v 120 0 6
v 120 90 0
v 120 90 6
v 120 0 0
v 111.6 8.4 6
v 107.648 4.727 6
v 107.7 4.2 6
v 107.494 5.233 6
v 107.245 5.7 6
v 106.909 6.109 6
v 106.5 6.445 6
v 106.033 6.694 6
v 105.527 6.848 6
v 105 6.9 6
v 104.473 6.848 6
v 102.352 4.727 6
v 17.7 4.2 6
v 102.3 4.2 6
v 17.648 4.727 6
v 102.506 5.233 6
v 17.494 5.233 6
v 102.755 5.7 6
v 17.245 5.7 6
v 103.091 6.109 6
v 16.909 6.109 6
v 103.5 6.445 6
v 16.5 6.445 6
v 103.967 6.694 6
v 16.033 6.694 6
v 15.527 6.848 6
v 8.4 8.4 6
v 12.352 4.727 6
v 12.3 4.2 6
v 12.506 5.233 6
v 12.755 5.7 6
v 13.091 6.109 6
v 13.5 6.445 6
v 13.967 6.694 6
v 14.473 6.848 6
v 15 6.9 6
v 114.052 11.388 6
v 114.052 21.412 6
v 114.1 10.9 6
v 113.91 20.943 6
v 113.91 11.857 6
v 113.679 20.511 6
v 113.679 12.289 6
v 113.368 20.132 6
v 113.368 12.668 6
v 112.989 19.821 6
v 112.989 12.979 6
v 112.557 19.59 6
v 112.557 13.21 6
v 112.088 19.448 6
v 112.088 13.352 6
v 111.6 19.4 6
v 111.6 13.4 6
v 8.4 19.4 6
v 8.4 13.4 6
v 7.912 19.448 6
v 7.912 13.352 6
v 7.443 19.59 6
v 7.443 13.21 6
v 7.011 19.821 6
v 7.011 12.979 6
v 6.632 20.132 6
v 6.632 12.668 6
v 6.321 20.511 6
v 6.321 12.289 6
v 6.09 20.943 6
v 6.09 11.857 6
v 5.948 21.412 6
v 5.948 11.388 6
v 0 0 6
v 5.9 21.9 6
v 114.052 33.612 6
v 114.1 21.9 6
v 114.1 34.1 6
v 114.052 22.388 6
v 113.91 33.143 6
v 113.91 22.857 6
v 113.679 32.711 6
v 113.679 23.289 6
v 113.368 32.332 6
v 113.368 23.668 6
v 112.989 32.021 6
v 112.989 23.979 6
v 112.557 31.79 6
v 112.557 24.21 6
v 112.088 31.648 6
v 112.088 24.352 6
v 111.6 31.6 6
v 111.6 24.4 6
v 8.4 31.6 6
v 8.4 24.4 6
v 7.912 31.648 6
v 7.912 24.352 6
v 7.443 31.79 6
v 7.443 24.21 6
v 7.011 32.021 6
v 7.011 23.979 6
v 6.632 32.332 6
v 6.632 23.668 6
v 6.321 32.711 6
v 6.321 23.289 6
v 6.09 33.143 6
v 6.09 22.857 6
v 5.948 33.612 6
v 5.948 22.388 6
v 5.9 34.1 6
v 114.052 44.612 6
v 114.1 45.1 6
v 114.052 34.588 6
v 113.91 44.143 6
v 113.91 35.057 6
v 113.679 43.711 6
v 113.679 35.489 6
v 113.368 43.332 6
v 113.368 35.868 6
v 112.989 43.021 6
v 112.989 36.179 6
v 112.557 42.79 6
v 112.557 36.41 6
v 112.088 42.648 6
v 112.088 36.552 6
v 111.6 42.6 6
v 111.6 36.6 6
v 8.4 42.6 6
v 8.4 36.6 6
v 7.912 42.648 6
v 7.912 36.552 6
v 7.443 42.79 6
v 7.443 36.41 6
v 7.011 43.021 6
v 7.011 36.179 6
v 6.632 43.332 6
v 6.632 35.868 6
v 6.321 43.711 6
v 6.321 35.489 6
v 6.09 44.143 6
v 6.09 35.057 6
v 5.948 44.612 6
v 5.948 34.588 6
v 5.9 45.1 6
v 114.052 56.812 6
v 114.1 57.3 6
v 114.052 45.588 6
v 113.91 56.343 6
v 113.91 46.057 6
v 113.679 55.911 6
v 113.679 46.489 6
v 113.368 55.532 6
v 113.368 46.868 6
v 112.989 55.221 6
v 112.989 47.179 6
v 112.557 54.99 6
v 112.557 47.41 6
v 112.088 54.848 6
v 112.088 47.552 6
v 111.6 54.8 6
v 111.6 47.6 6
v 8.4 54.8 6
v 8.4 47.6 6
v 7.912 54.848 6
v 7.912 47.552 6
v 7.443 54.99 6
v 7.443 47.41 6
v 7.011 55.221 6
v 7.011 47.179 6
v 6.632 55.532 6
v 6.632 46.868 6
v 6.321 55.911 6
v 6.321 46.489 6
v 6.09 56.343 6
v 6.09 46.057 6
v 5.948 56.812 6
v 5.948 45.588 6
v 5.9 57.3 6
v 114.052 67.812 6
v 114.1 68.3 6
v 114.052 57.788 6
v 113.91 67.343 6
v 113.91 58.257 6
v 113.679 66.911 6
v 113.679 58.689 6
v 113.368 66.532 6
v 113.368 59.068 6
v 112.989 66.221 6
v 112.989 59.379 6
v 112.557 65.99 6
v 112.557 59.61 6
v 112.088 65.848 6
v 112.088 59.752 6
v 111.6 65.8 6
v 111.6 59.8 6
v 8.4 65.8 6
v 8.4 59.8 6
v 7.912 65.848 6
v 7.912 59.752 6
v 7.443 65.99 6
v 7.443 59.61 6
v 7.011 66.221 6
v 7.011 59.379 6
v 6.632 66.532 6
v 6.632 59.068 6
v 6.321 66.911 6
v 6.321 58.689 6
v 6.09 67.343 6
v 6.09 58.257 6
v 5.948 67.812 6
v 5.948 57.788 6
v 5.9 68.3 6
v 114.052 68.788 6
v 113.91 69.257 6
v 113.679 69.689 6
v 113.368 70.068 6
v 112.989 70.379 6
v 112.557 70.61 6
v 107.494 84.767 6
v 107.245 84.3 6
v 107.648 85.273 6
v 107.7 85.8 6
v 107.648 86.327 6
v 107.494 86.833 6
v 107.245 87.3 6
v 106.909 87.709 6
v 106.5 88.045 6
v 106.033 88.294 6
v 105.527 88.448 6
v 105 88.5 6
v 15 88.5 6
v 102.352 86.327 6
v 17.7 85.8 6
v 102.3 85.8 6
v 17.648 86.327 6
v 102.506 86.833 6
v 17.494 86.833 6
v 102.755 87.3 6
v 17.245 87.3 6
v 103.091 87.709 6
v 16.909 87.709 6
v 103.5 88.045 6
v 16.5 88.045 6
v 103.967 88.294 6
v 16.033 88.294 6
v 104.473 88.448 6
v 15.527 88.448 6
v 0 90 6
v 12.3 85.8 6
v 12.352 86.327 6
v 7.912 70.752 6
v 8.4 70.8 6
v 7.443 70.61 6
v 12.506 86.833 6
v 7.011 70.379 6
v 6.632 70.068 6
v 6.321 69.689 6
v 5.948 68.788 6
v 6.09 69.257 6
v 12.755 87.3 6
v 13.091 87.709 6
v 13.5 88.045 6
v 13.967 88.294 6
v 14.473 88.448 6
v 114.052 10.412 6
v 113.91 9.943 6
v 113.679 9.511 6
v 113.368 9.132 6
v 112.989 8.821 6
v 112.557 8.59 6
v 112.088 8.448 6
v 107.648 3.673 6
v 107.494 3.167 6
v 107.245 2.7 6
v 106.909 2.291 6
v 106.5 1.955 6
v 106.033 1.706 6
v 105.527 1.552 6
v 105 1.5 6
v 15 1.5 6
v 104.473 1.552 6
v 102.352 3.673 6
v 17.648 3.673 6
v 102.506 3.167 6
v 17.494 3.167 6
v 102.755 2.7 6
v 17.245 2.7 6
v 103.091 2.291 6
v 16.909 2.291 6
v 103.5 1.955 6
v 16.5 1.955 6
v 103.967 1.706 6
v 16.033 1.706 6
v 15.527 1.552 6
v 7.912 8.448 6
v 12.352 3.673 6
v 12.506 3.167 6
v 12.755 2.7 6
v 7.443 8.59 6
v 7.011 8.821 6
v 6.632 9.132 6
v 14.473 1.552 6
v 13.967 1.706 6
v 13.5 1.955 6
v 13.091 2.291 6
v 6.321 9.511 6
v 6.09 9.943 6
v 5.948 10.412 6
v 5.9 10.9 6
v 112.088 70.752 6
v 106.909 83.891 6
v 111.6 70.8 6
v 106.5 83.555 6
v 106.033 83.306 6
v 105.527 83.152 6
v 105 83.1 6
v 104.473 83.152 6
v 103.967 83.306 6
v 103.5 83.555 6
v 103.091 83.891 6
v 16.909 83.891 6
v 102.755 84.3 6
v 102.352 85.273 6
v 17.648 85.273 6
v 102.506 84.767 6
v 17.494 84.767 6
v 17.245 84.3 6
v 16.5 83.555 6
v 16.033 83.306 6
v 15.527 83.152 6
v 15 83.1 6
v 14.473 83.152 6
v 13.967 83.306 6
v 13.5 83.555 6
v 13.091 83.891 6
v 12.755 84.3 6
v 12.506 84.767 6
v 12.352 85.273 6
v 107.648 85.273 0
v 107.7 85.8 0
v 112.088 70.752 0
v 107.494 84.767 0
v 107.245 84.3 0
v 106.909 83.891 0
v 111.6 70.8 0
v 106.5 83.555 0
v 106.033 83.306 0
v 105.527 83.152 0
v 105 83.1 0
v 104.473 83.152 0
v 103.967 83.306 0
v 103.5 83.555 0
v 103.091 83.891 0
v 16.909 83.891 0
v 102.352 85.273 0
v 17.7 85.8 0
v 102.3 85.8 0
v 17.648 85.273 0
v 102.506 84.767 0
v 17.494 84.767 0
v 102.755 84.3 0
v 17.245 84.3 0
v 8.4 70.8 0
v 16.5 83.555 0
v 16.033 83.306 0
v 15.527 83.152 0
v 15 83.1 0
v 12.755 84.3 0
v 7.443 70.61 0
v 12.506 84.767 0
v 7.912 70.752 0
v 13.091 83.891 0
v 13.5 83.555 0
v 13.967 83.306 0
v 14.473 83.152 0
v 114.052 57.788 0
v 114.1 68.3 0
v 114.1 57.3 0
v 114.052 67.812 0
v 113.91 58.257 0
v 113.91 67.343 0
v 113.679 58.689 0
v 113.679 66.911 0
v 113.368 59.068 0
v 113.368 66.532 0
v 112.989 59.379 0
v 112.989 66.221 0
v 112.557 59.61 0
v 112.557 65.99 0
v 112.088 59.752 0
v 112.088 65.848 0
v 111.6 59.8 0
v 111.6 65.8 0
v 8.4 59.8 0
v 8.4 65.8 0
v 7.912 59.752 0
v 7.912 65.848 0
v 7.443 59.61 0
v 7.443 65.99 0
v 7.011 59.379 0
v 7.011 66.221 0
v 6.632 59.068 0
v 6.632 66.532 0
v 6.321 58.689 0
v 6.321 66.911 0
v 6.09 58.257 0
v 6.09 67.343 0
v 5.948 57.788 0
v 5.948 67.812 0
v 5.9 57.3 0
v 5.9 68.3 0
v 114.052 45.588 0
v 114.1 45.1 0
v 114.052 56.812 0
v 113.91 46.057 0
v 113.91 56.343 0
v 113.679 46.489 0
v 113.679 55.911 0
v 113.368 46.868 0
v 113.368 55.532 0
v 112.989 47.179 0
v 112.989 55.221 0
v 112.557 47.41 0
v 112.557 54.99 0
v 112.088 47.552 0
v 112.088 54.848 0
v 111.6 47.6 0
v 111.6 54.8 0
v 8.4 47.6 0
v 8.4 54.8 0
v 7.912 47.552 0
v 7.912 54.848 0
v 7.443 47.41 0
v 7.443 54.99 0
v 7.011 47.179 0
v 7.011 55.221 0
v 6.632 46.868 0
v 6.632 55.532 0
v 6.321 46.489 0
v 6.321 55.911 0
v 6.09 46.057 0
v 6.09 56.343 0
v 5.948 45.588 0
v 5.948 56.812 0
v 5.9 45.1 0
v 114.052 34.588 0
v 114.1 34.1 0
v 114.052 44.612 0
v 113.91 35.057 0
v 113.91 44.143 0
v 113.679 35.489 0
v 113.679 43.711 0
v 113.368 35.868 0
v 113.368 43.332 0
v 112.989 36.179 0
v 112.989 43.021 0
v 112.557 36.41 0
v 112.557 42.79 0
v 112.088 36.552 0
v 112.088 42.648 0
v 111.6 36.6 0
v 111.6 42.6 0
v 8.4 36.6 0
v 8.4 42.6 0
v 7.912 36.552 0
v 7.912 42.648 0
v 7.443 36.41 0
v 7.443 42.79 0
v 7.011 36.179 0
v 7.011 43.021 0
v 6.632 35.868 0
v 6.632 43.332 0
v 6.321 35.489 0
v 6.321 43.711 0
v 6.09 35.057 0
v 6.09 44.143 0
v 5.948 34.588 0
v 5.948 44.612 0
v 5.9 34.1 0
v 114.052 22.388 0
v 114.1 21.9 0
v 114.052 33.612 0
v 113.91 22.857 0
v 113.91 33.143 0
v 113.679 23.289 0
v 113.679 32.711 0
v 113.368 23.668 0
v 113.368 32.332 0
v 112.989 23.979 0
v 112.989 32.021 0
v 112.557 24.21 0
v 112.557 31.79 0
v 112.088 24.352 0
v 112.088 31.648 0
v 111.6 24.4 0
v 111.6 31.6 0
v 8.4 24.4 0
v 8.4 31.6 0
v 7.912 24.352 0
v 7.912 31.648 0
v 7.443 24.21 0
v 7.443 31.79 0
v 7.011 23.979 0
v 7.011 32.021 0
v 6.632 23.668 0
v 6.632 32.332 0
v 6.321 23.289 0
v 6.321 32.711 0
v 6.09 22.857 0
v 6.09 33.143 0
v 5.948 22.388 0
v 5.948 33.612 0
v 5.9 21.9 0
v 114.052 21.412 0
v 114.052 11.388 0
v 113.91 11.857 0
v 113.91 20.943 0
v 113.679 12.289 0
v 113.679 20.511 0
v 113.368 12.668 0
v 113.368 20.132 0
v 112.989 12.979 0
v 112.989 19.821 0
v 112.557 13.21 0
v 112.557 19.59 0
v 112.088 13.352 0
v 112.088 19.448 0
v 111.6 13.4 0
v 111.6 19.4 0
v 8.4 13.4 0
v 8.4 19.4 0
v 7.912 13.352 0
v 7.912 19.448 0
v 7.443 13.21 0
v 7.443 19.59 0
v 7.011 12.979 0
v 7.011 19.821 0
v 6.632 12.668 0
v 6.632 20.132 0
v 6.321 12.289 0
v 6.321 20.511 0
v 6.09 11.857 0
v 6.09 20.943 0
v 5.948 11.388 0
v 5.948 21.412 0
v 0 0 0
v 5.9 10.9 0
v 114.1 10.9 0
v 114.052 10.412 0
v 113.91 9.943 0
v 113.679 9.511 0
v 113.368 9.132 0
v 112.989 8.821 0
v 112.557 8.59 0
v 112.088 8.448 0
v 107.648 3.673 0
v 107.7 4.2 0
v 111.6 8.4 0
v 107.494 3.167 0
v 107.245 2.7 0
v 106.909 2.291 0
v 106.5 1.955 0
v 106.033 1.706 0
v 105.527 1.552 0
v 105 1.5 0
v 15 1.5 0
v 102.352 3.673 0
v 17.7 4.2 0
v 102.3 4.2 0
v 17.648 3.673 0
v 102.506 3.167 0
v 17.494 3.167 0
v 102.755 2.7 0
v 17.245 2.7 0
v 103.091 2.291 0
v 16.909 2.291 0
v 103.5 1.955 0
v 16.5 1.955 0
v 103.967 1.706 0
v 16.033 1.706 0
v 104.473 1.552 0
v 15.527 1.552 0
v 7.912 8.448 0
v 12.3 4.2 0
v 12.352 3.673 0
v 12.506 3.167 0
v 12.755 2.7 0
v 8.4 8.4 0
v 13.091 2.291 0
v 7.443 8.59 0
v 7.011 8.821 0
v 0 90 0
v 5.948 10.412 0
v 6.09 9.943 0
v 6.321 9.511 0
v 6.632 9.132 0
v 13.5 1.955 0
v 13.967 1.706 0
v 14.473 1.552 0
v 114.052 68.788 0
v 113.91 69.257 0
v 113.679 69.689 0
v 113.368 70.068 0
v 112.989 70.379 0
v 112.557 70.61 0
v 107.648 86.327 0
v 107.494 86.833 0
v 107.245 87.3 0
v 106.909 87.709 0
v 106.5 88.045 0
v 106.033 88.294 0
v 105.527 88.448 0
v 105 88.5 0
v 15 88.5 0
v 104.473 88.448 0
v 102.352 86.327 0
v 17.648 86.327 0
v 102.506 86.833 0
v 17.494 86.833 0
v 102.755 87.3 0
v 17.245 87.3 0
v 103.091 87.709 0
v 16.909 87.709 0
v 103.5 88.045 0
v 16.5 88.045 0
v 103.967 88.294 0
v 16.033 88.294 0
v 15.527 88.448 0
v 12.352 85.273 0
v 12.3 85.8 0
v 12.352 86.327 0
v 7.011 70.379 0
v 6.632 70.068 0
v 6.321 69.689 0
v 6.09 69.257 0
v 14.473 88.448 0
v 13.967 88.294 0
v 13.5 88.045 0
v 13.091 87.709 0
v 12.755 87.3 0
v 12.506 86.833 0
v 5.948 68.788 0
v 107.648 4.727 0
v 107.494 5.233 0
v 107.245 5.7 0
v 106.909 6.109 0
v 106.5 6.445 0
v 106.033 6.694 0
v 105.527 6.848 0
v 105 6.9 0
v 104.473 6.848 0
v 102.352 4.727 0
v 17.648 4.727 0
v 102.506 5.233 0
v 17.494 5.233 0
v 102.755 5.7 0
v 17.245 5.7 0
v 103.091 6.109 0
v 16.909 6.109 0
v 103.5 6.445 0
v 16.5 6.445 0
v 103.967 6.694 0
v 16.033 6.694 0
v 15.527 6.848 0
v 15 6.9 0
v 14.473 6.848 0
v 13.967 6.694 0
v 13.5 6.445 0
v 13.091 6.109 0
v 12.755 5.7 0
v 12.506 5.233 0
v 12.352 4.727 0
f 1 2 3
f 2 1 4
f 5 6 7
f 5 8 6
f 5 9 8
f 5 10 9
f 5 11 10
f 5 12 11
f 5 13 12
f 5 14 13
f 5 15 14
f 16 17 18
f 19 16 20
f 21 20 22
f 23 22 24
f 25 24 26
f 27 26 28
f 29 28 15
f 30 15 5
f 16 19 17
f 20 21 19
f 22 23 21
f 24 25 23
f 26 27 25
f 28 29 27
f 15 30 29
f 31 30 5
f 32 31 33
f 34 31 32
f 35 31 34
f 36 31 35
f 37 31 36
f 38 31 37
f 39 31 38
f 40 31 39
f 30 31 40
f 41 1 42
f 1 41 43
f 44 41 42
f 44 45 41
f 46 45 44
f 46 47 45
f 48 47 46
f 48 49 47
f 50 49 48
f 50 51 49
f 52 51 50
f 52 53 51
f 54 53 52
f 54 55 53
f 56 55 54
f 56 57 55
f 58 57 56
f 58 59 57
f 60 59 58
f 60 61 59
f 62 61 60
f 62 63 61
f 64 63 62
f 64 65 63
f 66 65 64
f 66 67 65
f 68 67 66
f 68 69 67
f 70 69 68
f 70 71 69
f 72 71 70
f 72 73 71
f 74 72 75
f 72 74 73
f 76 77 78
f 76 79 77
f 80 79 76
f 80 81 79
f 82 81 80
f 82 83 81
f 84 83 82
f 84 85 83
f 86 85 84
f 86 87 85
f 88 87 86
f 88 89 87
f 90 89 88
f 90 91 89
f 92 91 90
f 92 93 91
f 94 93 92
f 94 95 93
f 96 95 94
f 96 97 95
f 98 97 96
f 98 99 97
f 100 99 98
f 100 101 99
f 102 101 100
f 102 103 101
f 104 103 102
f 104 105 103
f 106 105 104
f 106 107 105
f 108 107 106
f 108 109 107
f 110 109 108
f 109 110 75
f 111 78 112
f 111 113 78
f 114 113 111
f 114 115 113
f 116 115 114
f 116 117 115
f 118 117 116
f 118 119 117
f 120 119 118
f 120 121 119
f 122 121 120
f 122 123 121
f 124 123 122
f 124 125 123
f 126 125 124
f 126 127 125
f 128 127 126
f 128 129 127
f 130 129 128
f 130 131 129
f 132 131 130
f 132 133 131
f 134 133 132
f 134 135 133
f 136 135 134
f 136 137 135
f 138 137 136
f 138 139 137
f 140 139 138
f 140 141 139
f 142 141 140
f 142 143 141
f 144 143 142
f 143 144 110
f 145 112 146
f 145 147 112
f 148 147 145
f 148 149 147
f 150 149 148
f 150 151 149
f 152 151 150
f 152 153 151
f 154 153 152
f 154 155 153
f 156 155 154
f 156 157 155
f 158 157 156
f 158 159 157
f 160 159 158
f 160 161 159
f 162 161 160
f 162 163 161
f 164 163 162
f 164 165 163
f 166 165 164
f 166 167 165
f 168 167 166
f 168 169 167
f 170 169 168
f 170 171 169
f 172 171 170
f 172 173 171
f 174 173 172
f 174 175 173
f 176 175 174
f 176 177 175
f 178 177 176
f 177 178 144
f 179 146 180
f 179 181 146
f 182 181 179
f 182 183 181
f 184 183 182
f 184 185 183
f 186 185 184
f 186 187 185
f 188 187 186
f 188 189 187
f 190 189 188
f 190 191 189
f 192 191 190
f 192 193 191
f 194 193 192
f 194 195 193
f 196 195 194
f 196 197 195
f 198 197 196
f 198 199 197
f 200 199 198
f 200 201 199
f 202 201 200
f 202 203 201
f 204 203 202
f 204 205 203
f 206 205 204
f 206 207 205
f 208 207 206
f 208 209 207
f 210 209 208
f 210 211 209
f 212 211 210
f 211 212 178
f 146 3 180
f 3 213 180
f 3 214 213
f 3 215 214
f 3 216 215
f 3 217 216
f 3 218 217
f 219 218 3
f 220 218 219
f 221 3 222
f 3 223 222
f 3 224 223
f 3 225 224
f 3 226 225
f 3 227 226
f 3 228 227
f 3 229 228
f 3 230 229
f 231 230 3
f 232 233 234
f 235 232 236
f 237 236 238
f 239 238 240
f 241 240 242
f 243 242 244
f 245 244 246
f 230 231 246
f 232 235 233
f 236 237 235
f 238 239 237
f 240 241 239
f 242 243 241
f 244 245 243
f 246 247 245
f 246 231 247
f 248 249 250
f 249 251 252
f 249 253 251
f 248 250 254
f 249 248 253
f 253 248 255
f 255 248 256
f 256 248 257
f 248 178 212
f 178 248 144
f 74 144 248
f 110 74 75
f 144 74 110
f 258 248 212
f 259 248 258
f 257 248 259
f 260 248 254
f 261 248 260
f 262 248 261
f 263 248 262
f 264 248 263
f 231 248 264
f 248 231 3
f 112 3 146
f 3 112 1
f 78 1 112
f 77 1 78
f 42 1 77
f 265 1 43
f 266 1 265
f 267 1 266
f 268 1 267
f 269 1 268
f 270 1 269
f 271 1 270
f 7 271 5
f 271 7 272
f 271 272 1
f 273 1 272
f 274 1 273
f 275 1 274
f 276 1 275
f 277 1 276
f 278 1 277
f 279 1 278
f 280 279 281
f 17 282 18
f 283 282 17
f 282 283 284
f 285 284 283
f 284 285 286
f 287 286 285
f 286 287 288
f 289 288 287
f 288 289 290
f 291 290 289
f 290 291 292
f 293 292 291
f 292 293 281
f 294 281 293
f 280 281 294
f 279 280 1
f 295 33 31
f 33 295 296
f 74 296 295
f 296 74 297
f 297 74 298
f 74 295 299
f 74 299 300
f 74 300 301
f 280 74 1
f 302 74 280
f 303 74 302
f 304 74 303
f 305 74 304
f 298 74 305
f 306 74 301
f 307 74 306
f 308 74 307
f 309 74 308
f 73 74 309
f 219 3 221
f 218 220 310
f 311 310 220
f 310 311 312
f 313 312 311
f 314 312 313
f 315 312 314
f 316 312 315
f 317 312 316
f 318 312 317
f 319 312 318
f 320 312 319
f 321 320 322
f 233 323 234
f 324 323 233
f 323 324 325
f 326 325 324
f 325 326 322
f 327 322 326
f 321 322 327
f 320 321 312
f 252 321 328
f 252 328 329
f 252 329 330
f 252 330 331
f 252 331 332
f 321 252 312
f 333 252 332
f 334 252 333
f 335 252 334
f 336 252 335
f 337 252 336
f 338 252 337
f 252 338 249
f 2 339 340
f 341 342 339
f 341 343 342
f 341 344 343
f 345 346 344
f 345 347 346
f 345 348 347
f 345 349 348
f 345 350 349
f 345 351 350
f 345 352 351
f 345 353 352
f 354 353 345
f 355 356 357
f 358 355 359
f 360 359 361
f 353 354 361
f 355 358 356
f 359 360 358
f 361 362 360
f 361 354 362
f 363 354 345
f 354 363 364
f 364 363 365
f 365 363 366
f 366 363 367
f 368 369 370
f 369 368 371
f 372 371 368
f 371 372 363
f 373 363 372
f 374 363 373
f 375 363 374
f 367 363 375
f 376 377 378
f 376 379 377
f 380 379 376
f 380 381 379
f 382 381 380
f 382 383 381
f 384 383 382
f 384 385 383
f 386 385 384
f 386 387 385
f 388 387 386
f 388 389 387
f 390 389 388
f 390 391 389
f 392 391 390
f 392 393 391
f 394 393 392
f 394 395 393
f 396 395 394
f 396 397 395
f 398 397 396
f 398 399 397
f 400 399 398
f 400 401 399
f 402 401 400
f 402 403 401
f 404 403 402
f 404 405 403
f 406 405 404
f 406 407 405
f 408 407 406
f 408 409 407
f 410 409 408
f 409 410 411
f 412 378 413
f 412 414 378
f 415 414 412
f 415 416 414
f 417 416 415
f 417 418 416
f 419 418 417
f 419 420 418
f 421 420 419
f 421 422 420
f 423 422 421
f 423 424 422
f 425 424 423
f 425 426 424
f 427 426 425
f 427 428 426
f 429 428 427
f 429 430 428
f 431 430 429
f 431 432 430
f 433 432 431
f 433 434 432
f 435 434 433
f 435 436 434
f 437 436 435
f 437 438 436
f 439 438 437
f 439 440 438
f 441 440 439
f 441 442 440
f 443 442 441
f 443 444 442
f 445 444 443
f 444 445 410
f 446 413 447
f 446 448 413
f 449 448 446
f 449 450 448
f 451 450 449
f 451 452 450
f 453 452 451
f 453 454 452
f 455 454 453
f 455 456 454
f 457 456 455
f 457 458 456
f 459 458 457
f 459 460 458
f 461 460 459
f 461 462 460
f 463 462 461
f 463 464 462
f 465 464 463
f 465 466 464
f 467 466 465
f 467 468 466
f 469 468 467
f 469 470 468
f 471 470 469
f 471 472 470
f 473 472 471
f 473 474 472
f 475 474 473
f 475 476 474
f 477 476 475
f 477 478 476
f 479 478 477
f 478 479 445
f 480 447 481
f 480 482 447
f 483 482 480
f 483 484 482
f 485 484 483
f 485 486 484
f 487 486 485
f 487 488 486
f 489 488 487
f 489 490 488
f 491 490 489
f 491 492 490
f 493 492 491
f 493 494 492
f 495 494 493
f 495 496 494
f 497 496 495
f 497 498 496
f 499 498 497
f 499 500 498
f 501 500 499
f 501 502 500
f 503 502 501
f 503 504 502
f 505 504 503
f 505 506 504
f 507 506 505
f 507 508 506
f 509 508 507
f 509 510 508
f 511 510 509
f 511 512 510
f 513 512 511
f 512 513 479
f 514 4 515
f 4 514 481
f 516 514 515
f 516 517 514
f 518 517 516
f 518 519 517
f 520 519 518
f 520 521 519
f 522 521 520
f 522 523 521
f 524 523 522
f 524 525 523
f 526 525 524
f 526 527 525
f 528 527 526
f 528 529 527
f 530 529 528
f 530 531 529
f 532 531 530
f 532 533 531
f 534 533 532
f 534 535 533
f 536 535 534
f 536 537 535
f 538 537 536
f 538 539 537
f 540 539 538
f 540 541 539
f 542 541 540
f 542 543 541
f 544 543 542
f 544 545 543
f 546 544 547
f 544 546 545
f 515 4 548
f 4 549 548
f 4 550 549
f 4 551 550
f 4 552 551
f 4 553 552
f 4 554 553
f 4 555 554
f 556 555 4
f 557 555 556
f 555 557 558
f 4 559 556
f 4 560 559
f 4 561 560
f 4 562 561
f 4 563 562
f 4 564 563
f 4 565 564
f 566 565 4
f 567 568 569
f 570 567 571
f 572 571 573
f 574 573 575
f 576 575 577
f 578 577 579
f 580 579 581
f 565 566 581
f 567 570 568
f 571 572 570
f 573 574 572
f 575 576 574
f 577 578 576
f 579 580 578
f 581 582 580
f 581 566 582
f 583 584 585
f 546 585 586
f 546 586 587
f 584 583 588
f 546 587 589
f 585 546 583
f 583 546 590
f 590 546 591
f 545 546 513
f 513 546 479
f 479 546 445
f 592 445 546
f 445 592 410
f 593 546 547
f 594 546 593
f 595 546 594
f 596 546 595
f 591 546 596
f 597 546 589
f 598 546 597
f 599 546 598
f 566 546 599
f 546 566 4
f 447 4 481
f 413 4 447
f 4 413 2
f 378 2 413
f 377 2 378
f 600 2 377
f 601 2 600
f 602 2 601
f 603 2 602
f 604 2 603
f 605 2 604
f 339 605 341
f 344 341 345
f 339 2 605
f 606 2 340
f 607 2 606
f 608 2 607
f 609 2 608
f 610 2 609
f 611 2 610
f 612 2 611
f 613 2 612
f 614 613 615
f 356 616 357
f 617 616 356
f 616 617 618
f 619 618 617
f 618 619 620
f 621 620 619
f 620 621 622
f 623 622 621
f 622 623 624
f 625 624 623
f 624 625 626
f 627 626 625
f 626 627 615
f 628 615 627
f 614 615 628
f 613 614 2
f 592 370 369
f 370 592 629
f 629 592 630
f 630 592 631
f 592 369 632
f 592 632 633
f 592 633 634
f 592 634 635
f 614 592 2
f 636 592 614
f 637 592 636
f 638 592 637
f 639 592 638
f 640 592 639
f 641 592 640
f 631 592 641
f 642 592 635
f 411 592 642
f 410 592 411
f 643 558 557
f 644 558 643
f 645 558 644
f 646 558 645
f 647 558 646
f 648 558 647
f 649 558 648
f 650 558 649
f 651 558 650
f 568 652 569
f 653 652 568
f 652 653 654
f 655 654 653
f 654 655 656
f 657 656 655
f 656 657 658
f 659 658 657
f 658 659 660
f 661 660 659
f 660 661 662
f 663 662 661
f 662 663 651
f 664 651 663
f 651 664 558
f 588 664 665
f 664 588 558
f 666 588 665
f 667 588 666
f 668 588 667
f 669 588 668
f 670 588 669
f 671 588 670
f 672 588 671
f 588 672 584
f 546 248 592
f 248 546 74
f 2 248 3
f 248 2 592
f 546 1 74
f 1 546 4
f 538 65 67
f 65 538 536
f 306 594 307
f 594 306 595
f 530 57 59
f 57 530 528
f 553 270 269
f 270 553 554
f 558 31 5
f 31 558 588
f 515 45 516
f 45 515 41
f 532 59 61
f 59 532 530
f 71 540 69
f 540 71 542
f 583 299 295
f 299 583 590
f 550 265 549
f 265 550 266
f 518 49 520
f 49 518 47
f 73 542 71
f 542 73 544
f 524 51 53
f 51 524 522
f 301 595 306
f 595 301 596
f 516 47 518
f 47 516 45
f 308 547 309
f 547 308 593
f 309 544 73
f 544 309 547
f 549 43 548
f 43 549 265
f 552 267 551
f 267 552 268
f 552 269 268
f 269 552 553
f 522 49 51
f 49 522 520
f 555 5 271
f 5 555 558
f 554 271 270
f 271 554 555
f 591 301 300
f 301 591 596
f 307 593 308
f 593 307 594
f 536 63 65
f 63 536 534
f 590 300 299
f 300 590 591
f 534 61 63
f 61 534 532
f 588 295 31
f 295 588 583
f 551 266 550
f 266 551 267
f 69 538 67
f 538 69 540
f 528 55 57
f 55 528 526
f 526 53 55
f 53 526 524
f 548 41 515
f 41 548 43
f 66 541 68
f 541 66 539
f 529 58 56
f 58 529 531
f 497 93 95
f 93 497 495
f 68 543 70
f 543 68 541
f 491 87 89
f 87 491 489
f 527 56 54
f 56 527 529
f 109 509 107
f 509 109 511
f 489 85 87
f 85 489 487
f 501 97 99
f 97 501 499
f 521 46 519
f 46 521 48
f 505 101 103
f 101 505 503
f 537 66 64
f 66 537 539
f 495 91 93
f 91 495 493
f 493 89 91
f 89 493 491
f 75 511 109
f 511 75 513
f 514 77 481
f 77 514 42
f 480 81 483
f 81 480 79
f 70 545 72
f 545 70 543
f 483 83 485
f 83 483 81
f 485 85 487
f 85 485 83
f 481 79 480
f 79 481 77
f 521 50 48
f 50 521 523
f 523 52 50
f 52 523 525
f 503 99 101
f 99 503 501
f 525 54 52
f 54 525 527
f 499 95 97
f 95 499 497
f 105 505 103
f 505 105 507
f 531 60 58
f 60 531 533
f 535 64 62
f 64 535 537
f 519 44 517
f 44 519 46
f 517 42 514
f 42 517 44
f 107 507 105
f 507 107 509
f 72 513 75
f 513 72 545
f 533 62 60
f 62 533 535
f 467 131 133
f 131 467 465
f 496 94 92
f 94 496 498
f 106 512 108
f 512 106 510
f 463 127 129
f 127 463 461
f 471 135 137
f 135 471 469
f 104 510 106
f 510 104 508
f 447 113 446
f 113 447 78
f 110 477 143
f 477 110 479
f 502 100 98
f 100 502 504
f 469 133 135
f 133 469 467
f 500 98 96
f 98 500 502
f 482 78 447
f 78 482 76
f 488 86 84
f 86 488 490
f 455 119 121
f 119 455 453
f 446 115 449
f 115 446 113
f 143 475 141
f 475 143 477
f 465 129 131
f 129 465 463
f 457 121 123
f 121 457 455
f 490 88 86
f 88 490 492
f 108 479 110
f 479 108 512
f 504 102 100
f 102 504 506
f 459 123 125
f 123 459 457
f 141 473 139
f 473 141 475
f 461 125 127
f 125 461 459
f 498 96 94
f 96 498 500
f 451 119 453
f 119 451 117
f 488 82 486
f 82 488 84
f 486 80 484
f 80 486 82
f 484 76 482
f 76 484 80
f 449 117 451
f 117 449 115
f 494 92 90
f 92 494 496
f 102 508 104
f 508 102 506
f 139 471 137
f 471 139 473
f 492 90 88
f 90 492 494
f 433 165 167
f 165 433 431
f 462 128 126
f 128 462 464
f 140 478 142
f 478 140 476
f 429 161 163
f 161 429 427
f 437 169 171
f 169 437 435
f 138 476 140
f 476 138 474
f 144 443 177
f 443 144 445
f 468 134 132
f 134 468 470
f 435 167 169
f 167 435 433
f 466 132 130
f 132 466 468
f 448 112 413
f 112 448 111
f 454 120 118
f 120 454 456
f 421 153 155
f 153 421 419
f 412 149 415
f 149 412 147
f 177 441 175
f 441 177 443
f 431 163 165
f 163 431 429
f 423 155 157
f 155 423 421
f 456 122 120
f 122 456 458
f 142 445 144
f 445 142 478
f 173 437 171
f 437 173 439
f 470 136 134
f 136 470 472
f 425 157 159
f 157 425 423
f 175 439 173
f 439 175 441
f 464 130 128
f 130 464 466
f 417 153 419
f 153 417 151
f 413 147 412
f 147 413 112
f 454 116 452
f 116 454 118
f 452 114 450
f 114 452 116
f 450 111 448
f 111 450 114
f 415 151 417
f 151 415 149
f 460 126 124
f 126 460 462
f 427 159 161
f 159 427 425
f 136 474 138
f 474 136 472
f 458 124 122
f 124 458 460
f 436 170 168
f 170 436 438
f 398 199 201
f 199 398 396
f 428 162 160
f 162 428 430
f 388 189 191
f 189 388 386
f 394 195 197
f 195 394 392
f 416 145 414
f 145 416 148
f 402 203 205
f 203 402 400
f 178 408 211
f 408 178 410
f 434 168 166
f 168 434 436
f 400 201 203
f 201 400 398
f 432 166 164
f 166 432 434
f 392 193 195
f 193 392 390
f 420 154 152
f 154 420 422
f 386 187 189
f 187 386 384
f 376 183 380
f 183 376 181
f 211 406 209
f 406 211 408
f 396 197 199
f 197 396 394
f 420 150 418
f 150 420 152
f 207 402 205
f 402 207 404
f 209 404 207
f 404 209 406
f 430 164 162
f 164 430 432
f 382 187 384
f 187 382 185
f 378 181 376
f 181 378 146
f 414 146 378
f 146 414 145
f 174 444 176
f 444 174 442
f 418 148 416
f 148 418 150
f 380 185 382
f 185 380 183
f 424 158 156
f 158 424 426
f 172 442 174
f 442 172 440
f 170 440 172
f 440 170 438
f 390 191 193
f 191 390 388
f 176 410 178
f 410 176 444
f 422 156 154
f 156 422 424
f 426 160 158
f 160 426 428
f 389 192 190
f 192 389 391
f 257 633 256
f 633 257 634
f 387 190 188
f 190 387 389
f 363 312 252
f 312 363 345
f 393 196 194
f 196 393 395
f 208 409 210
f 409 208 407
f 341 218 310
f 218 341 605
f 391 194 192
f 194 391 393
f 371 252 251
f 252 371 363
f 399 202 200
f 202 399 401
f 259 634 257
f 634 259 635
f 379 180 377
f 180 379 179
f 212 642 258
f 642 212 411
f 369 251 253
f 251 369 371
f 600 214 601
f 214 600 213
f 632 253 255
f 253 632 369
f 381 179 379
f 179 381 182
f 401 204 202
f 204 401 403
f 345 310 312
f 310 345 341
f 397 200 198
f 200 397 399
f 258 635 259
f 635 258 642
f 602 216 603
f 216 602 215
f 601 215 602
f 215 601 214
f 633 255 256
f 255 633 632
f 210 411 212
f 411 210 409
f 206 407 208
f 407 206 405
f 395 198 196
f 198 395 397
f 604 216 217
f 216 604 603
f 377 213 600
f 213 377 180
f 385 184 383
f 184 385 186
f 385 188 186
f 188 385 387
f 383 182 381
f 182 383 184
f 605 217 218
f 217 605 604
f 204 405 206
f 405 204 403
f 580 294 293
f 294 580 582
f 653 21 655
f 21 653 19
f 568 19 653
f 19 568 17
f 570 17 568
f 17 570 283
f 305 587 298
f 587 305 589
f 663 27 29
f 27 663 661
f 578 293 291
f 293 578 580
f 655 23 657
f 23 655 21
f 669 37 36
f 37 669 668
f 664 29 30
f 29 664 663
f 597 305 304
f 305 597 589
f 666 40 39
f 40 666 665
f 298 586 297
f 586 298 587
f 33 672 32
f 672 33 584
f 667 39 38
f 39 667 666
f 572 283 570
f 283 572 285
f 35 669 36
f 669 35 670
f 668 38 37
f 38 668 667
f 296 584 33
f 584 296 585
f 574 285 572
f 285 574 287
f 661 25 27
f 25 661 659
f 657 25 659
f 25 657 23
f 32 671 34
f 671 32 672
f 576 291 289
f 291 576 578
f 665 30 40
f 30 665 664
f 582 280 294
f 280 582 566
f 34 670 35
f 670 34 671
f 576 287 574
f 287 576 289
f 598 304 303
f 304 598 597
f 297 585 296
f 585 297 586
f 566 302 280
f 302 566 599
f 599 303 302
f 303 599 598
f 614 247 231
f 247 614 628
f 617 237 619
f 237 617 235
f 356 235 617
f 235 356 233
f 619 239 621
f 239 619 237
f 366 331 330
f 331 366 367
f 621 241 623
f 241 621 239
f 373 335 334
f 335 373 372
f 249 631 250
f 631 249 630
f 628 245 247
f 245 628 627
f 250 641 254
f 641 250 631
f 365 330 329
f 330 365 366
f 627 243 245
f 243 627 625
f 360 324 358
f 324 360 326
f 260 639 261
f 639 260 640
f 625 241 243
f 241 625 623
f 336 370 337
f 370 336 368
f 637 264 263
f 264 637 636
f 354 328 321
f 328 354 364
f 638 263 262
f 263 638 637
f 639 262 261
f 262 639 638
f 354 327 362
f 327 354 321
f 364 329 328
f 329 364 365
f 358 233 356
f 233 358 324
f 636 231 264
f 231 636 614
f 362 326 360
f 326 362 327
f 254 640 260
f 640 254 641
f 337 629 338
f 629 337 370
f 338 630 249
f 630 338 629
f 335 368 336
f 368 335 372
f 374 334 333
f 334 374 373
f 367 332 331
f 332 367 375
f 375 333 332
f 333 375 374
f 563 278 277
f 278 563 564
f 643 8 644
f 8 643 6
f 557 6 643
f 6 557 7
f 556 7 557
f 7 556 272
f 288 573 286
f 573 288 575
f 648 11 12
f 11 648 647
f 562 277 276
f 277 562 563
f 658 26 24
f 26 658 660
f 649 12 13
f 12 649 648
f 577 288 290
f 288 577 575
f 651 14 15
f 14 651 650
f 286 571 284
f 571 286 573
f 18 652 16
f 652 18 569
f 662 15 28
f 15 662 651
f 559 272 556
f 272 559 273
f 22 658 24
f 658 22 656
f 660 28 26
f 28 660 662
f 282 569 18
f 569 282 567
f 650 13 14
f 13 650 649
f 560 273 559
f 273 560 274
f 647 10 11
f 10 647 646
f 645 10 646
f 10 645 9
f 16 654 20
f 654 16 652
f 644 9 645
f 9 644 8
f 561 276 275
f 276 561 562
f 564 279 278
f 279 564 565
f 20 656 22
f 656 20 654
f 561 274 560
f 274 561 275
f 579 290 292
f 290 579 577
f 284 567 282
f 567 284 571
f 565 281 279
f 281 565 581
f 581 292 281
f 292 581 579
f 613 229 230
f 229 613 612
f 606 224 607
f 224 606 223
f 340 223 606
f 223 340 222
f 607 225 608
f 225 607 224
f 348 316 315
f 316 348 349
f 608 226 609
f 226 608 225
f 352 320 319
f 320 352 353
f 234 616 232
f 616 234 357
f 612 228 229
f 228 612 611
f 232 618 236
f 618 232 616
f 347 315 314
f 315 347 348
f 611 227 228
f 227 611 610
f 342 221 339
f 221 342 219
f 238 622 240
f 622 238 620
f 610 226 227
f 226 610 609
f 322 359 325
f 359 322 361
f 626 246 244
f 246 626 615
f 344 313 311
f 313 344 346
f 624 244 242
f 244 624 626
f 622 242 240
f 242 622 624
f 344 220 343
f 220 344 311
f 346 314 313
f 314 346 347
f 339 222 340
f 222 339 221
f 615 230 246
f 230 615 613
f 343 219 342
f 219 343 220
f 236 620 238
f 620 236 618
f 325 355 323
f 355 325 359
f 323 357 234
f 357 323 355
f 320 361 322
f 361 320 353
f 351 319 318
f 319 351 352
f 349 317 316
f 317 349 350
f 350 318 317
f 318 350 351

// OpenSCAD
$fn = 32;

// ----------------------------------------------------------------------
// Slotted panel: 120 x 90 mm, 6 рядов of slots
// ----------------------------------------------------------------------

// --- parameters (mm) ---
panel_w = 120;            // panel width
panel_d = 90;             // panel depth
thick = 6;                // panel thickness
slot_w = 5;               // slot width
pitch0 = 11;              // first row pitch
pitch_step = 1.2;         // pitch increase per row
margin = 8.4;             // margin around the slot field
rows = 6;                 // number of slot rows
mount_d = 5.4;            // mounting holes
mount_x = 45;             // mounting hole offset

difference() {
  union() {
    cube([panel_w, panel_d, thick]);
  }
  /* slot rows: stadium shaped cutters, 2.5 mm clear of both faces */
  /* row 0: pitch 11, length 103.2 */
  hull() {
    translate([8.4, 10.9, -2.5]) cylinder(h = thick + 5, d = slot_w);
    translate([111.6, 10.9, -2.5]) cylinder(h = thick + 5, d = slot_w);
  }
  /* row 1: pitch 12.2, length 103.2 */
  hull() {
    translate([8.4, 21.9, -2.5]) cylinder(h = thick + 5, d = slot_w);
    translate([111.6, 21.9, -2.5]) cylinder(h = thick + 5, d = slot_w);
  }
  /* row 2: pitch 11, length 103.2 */
  hull() {
    translate([8.4, 34.1, -2.5]) cylinder(h = thick + 5, d = slot_w);
    translate([111.6, 34.1, -2.5]) cylinder(h = thick + 5, d = slot_w);
  }
  /* row 3: pitch 12.2, length 103.2 */
  hull() {
    translate([8.4, 45.1, -2.5]) cylinder(h = thick + 5, d = slot_w);
    translate([111.6, 45.1, -2.5]) cylinder(h = thick + 5, d = slot_w);
  }
  /* row 4: pitch 11, length 103.2 */
  hull() {
    translate([8.4, 57.3, -2.5]) cylinder(h = thick + 5, d = slot_w);
    translate([111.6, 57.3, -2.5]) cylinder(h = thick + 5, d = slot_w);
  }
  /* row 5: pitch 12.2, length 103.2 */
  hull() {
    translate([8.4, 68.3, -2.5]) cylinder(h = thick + 5, d = slot_w);
    translate([111.6, 68.3, -2.5]) cylinder(h = thick + 5, d = slot_w);
  }
  translate([15, 4.2, -2.5]) cylinder(h = 11, d = mount_d);
  translate([15, 85.8, -2.5]) cylinder(h = 11, d = mount_d);
  translate([105, 4.2, -2.5]) cylinder(h = 11, d = mount_d);
  translate([105, 85.8, -2.5]) cylinder(h = 11, d = mount_d);
}
